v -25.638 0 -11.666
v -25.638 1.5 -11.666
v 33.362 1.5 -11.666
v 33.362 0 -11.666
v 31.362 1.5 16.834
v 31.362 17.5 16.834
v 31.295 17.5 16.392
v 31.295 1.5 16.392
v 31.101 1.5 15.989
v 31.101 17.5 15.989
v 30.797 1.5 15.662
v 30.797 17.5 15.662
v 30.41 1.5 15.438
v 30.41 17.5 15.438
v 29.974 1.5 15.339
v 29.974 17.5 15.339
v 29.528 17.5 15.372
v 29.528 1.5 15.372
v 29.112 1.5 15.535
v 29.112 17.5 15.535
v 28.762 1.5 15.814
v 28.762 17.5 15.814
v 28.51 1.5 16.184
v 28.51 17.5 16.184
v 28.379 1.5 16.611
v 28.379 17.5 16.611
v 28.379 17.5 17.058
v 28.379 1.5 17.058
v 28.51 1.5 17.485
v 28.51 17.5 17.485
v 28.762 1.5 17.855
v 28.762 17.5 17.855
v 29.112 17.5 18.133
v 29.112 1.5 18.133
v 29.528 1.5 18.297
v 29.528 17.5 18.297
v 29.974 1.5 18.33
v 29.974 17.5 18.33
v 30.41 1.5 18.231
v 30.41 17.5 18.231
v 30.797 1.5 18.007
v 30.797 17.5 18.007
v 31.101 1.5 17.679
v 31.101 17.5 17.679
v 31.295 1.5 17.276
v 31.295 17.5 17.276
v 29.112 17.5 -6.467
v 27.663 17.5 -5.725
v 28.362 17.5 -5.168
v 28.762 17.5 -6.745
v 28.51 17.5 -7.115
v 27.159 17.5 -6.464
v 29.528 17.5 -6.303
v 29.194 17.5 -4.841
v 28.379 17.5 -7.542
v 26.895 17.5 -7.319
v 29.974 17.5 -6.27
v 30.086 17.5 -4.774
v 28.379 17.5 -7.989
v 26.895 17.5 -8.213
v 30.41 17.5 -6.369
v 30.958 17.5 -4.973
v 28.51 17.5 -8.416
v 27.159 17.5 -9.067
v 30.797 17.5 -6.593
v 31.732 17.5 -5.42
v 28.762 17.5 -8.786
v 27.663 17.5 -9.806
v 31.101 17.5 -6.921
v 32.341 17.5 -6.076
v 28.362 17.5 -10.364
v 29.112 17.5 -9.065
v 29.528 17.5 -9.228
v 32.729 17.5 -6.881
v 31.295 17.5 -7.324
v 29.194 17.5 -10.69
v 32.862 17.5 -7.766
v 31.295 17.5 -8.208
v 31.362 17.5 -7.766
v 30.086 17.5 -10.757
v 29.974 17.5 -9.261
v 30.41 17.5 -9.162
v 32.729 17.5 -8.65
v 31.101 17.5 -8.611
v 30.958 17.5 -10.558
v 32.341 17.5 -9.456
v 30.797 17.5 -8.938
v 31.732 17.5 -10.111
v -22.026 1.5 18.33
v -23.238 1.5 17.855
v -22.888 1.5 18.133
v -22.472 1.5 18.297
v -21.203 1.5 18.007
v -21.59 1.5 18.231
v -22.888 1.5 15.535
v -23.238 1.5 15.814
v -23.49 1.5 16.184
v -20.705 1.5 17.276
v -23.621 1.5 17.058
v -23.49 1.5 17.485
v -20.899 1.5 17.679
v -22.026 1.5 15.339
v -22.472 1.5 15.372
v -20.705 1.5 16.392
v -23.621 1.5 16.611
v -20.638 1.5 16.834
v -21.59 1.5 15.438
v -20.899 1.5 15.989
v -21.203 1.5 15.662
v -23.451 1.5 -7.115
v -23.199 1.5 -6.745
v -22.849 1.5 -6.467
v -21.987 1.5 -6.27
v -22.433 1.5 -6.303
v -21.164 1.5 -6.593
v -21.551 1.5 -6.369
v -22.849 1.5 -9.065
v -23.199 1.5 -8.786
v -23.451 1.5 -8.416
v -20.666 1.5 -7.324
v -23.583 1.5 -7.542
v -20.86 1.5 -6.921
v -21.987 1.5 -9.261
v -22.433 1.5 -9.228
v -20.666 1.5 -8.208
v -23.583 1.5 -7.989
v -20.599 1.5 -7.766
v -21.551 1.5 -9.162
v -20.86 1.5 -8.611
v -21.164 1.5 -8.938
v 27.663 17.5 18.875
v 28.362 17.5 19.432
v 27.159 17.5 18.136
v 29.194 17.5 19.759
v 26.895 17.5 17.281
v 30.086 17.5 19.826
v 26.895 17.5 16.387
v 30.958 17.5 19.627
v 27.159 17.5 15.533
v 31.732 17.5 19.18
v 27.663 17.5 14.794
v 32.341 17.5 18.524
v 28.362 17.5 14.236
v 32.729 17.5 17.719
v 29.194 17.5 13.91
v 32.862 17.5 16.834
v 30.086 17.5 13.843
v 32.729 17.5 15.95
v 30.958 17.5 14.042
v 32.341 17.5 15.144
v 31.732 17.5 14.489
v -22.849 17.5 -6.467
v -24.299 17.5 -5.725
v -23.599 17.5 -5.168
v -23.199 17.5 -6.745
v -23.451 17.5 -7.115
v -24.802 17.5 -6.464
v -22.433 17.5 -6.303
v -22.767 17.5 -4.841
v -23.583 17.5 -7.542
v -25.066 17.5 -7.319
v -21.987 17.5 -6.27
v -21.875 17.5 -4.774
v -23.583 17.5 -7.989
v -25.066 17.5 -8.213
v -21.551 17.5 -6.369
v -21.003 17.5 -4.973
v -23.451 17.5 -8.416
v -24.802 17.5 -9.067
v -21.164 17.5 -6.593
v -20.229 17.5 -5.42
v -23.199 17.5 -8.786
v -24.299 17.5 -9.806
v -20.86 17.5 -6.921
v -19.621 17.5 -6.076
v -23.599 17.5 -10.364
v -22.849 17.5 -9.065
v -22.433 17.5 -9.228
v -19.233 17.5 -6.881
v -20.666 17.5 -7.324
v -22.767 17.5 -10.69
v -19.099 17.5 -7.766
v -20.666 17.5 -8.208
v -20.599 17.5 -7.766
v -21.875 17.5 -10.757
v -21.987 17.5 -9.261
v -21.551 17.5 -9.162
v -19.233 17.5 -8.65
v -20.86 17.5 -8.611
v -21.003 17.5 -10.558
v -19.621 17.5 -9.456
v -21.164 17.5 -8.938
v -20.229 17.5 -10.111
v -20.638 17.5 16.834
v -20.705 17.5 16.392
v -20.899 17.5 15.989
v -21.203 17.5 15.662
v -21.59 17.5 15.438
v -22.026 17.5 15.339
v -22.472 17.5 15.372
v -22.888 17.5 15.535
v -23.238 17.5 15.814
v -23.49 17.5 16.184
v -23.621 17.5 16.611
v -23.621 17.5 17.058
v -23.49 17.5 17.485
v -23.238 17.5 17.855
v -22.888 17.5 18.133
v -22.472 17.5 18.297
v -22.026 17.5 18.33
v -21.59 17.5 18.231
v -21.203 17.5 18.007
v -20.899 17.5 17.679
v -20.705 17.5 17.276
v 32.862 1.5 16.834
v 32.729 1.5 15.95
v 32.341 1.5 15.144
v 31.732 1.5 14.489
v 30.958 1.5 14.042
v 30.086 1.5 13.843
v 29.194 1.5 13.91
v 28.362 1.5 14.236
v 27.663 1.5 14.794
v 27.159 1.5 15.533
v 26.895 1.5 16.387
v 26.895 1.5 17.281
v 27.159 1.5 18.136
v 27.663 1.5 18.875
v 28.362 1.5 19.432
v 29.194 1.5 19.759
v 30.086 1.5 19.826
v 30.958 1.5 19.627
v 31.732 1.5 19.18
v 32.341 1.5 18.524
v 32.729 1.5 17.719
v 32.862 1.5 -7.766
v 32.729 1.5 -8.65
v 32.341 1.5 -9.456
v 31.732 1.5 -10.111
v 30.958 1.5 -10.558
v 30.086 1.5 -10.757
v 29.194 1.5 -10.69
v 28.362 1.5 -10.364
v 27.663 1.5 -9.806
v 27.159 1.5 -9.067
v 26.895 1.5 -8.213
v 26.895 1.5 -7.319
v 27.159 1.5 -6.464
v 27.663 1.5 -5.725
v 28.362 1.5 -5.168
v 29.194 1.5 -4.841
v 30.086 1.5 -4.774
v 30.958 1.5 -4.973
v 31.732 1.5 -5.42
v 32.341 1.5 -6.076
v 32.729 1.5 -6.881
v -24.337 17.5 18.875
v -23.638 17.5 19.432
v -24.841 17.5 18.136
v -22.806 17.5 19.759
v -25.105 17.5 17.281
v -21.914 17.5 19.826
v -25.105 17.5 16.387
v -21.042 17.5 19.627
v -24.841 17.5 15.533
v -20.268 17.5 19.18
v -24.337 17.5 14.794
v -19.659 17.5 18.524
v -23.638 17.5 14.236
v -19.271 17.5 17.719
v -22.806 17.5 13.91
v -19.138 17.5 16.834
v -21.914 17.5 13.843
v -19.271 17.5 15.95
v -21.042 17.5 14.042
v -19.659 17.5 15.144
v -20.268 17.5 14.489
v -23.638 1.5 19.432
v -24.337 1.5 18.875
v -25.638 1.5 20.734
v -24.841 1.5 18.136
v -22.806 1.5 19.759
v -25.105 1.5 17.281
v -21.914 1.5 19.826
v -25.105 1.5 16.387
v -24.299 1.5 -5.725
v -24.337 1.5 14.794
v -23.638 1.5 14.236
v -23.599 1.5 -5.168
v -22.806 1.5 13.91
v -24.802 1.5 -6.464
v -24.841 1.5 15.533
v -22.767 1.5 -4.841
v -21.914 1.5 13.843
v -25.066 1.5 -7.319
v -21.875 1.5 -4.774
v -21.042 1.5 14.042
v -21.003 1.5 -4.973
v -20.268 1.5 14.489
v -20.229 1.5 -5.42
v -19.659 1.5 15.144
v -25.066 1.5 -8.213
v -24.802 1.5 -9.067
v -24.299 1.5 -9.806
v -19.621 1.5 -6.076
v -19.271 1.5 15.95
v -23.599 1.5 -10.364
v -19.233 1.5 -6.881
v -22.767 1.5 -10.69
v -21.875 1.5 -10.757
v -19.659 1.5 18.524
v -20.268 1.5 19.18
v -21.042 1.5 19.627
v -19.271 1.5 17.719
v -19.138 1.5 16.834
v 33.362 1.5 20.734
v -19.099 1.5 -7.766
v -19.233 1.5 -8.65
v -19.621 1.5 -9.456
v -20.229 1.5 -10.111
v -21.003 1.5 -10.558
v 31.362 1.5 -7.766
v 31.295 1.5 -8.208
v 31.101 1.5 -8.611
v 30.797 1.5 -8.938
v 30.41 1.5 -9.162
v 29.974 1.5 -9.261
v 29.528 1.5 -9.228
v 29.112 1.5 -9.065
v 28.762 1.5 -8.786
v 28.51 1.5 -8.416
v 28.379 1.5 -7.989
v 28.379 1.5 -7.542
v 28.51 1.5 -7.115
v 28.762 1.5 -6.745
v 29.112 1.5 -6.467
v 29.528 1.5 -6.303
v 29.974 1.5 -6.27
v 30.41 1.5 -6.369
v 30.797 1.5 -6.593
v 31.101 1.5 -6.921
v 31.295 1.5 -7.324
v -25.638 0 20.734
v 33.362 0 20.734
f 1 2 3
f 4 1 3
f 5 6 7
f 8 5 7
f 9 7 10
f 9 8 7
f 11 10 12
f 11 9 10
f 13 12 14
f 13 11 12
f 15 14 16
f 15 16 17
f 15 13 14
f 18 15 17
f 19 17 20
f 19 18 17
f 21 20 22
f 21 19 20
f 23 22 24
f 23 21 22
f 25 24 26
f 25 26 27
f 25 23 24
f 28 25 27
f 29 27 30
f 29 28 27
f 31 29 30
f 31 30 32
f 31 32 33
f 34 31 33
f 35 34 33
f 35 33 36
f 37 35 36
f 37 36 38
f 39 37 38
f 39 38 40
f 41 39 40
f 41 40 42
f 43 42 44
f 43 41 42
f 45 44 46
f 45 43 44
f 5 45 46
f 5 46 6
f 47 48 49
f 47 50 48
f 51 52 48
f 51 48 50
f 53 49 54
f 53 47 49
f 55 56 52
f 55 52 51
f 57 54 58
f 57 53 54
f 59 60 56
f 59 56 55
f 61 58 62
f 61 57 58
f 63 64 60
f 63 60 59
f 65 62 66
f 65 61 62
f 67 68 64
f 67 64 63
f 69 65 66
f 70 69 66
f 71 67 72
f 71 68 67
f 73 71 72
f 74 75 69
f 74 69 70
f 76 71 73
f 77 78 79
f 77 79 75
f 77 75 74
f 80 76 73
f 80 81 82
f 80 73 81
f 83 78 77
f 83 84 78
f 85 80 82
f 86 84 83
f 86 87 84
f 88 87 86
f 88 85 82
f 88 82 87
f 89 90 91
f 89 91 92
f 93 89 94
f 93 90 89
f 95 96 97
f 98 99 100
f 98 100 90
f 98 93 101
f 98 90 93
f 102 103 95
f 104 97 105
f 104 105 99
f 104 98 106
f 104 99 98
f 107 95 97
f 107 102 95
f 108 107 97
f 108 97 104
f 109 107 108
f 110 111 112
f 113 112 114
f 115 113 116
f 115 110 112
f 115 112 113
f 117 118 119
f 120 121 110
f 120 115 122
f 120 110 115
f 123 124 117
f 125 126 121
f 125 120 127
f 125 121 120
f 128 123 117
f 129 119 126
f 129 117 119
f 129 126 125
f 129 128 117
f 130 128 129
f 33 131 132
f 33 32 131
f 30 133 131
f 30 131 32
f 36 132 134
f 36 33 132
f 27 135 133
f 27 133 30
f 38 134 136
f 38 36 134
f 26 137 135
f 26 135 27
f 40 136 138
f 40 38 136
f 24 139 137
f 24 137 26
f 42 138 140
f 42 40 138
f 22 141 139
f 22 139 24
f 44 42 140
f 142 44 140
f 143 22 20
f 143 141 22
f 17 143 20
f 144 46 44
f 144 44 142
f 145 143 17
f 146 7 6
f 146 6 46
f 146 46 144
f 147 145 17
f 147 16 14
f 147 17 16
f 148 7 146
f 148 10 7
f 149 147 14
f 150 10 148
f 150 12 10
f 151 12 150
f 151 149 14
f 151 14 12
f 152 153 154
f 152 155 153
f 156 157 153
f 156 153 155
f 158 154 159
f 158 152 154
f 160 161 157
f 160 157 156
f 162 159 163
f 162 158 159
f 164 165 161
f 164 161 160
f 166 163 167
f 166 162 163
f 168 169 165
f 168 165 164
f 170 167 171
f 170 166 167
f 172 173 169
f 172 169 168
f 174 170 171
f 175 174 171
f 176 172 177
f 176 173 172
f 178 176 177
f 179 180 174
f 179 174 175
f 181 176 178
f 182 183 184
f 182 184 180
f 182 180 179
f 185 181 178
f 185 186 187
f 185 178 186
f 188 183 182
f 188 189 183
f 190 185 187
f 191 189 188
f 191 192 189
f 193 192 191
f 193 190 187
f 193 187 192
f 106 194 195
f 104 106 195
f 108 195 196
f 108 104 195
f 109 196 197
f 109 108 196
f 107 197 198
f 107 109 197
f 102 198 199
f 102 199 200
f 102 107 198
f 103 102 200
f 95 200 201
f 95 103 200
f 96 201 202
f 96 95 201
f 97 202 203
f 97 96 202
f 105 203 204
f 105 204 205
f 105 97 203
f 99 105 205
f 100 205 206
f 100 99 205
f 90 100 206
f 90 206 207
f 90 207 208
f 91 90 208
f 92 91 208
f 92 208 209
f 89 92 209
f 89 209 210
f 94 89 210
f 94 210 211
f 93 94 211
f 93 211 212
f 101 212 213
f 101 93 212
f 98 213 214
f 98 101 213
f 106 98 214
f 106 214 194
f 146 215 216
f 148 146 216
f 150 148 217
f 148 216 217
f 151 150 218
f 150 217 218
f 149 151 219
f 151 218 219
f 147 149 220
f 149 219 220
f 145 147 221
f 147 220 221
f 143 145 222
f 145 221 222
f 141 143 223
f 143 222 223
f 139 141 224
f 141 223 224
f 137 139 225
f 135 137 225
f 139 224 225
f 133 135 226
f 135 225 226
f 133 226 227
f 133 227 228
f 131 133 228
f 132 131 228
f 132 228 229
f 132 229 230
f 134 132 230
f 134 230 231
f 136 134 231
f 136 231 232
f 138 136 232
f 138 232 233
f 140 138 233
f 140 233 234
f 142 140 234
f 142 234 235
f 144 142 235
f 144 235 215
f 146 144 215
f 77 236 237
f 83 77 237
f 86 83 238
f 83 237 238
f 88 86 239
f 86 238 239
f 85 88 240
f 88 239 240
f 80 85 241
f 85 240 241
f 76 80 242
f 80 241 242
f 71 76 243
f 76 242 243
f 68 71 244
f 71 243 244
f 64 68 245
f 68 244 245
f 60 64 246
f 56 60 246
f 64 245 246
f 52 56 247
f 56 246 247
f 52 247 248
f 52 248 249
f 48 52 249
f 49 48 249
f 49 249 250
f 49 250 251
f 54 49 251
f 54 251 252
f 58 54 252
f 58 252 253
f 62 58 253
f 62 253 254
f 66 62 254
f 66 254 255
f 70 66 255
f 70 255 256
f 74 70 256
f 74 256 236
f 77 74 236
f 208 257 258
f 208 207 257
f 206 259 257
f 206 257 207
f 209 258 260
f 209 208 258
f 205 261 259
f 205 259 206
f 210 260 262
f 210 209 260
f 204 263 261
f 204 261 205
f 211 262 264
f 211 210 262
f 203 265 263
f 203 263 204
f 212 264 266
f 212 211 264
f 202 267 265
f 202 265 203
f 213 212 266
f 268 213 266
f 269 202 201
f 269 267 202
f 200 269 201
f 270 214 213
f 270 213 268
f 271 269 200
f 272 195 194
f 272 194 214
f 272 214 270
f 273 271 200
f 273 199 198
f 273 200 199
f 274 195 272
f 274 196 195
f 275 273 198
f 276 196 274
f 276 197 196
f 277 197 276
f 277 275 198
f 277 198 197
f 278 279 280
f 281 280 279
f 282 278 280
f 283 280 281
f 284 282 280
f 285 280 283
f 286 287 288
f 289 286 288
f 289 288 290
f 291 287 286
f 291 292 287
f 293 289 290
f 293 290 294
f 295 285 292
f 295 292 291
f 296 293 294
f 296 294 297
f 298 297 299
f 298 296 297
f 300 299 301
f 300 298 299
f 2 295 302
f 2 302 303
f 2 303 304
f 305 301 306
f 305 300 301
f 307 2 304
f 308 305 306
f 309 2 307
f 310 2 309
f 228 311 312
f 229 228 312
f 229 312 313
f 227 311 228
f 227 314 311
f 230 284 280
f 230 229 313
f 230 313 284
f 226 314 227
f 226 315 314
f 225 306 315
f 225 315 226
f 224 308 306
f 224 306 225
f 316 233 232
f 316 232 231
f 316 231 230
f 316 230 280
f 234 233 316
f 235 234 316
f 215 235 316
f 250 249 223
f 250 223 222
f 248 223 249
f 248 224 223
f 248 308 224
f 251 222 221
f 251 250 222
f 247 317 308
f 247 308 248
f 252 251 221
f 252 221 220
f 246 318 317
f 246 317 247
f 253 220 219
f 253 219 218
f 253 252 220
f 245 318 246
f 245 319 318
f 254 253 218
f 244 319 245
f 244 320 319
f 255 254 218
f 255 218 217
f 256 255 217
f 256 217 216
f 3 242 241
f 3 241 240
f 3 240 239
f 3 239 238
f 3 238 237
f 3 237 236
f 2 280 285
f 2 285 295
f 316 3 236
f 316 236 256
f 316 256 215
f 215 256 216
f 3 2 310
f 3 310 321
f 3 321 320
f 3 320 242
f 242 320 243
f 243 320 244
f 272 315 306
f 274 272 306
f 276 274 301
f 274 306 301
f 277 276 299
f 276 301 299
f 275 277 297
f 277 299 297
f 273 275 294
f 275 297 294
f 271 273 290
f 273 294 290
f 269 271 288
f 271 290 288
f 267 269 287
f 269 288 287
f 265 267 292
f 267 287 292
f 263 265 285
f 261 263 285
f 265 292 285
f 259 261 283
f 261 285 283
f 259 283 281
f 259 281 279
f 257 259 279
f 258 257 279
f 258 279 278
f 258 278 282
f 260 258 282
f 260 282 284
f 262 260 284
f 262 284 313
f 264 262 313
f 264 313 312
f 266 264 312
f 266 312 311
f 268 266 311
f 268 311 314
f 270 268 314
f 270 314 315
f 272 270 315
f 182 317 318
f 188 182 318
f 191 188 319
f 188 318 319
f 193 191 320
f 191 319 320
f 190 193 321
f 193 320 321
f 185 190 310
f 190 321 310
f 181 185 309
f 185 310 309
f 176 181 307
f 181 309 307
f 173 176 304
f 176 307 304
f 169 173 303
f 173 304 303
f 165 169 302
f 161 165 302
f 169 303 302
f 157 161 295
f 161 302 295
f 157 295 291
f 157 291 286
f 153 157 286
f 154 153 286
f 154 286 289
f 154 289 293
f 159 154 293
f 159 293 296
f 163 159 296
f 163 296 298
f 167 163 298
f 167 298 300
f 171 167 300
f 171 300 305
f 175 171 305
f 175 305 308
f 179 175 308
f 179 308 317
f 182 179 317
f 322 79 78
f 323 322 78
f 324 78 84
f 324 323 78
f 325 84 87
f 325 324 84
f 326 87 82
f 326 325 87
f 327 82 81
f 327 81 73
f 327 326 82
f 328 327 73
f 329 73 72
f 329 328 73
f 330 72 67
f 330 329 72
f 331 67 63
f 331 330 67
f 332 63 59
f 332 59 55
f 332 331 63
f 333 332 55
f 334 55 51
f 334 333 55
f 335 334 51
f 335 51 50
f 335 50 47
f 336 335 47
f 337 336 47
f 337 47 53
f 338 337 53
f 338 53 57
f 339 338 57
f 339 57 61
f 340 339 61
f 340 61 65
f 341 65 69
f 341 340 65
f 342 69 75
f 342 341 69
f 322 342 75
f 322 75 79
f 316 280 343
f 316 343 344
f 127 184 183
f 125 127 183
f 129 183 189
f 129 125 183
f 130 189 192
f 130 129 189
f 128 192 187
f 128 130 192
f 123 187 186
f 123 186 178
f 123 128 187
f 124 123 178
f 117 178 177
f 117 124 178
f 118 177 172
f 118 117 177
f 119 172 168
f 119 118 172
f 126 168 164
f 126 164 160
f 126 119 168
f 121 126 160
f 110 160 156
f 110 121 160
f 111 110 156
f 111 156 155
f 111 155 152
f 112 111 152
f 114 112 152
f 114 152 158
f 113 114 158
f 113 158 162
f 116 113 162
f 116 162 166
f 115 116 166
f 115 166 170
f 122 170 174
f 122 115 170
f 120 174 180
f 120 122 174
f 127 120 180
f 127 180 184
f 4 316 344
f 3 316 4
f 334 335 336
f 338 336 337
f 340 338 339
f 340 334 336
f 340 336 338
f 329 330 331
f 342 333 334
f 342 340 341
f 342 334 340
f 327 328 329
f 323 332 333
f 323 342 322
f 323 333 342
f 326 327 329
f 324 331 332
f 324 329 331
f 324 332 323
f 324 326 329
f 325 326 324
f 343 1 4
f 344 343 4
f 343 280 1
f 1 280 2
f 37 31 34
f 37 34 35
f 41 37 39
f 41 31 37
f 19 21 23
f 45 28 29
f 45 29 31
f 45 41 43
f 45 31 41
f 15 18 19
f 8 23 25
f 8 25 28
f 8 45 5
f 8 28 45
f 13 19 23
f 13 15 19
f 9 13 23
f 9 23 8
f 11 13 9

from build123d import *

# Parameters (mm, degrees)
SKETCH_2_W          = 57
SKETCH_2_H          = 40.4
EXTRUDE_1_DEPTH     = 1.5
SKETCH_4_R          = 3
SKETCH_4_R_2        = 1.5
EXTRUDE_3_DEPTH     = 16
SKETCH_5_W          = 57
SKETCH_5_H          = 4
CUT_EXTRUDE_1_DEPTH = 2.5
SKETCH_6_W          = 1
SKETCH_6_H          = 32.4
EXTRUDE_4_DEPTH     = 1.5


with BuildPart() as part:
    # 草图2 → 凸台-拉伸1 (new body)
    with BuildSketch(Plane(origin=(0, 0, 0), x_dir=(1, 0, 0), z_dir=(0, 1, 0))):
        with Locations((3.861898857, -4.534326193)):
            Rectangle(SKETCH_2_W, SKETCH_2_H)
    extrude(amount=EXTRUDE_1_DEPTH)

    # 草图4 → 凸台-拉伸3 (add)
    with BuildSketch(Plane(origin=(0, 1.5, 0), x_dir=(1, 0, 0), z_dir=(0, 1, 0))):
        with Locations((-22.099370277, 7.765673807)):
            Circle(SKETCH_4_R)
        with Locations((-22.099370277, 7.765673807)):
            Circle(SKETCH_4_R_2, mode=Mode.SUBTRACT)
        with Locations((-22.138101143, -16.834326193)):
            Circle(SKETCH_4_R)
        with Locations((-22.138101143, -16.834326193)):
            Circle(SKETCH_4_R_2, mode=Mode.SUBTRACT)
        with Locations((29.861898857, -16.834326193)):
            Circle(SKETCH_4_R)
        with Locations((29.861898857, -16.834326193)):
            Circle(SKETCH_4_R_2, mode=Mode.SUBTRACT)
        with Locations((29.861898857, 7.765673807)):
            Circle(SKETCH_4_R)
        with Locations((29.861898857, 7.765673807)):
            Circle(SKETCH_4_R_2, mode=Mode.SUBTRACT)
    extrude(amount=EXTRUDE_3_DEPTH)

    # 草图5 → 切除-拉伸1 (cut, through all)
    with BuildSketch(Plane(origin=(0, 1.5, 0), x_dir=(1, 0, 0), z_dir=(0, 1, 0))):
        with Locations((3.861898857, 13.665673807)):
            Rectangle(SKETCH_5_W, SKETCH_5_H)
        with Locations((3.861898857, -22.734326193)):
            Rectangle(SKETCH_5_W, SKETCH_5_H)
    extrude(amount=-CUT_EXTRUDE_1_DEPTH, mode=Mode.SUBTRACT)

    # 草图6 → 凸台-拉伸4 (add)
    with BuildSketch(Plane(origin=(0, 1.5, 0), x_dir=(1, 0, 0), z_dir=(0, 1, 0))):
        with Locations((-25.138101143, -4.534326193)):
            Rectangle(SKETCH_6_W, SKETCH_6_H)
        with Locations((32.861898857, -4.534326193)):
            Rectangle(SKETCH_6_W, SKETCH_6_H)
    extrude(amount=-EXTRUDE_4_DEPTH)


solid = part.part
